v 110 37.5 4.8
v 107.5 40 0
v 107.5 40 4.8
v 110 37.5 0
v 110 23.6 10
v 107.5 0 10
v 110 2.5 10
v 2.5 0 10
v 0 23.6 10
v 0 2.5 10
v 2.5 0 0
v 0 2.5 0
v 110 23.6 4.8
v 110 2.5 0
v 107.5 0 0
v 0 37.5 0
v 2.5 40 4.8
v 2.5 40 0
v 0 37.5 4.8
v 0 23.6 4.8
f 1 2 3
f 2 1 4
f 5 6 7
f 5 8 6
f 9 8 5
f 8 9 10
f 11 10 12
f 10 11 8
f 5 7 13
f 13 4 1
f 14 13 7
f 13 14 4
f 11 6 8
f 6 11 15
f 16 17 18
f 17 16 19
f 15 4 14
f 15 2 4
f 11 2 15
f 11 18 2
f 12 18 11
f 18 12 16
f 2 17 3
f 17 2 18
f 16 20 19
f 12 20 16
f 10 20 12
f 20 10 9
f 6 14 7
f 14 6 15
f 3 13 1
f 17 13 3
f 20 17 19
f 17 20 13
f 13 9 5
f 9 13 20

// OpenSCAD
$fn = 32;

// ----------------------------------------------------------------------
// Stepped bar: sidestep, 110 x 40 x 10/4.8 mm
// ----------------------------------------------------------------------

// --- parameters (mm) ---
bar_l = 110;              // bar length, X
bar_w = 40;               // bar width, Y
plate_t = 10;             // thickness of the thick zone, Z
thin_t = 4.8;             // thickness of the thin zone
corner_c = 2.5;           // corner chamfer of the bar
step_cut = 5.2;           // material removed from the thin zone
ledge_y = 23.6;           // start of the ledge from the front edge
depth_1 = 5.2;            // depth of cut 1 from the top face

profile = [[2.5, 0], [107.5, 0], [110, 2.5], [110, 37.5], [107.5, 40], [2.5, 40], [0, 37.5], [0, 2.5]];  // primary outline, 8 points, counter clockwise
void_1 = [[-1, 23.6], [111, 23.6], [111, 41], [-1, 41]];  // ledge cut along one edge, 4 points

// --- the one profile operation ---
difference() {
  linear_extrude(height = plate_t) polygon(points = profile);
  translate([0, 0, plate_t - depth_1])
    linear_extrude(height = depth_1 + 1) polygon(points = void_1);
}
